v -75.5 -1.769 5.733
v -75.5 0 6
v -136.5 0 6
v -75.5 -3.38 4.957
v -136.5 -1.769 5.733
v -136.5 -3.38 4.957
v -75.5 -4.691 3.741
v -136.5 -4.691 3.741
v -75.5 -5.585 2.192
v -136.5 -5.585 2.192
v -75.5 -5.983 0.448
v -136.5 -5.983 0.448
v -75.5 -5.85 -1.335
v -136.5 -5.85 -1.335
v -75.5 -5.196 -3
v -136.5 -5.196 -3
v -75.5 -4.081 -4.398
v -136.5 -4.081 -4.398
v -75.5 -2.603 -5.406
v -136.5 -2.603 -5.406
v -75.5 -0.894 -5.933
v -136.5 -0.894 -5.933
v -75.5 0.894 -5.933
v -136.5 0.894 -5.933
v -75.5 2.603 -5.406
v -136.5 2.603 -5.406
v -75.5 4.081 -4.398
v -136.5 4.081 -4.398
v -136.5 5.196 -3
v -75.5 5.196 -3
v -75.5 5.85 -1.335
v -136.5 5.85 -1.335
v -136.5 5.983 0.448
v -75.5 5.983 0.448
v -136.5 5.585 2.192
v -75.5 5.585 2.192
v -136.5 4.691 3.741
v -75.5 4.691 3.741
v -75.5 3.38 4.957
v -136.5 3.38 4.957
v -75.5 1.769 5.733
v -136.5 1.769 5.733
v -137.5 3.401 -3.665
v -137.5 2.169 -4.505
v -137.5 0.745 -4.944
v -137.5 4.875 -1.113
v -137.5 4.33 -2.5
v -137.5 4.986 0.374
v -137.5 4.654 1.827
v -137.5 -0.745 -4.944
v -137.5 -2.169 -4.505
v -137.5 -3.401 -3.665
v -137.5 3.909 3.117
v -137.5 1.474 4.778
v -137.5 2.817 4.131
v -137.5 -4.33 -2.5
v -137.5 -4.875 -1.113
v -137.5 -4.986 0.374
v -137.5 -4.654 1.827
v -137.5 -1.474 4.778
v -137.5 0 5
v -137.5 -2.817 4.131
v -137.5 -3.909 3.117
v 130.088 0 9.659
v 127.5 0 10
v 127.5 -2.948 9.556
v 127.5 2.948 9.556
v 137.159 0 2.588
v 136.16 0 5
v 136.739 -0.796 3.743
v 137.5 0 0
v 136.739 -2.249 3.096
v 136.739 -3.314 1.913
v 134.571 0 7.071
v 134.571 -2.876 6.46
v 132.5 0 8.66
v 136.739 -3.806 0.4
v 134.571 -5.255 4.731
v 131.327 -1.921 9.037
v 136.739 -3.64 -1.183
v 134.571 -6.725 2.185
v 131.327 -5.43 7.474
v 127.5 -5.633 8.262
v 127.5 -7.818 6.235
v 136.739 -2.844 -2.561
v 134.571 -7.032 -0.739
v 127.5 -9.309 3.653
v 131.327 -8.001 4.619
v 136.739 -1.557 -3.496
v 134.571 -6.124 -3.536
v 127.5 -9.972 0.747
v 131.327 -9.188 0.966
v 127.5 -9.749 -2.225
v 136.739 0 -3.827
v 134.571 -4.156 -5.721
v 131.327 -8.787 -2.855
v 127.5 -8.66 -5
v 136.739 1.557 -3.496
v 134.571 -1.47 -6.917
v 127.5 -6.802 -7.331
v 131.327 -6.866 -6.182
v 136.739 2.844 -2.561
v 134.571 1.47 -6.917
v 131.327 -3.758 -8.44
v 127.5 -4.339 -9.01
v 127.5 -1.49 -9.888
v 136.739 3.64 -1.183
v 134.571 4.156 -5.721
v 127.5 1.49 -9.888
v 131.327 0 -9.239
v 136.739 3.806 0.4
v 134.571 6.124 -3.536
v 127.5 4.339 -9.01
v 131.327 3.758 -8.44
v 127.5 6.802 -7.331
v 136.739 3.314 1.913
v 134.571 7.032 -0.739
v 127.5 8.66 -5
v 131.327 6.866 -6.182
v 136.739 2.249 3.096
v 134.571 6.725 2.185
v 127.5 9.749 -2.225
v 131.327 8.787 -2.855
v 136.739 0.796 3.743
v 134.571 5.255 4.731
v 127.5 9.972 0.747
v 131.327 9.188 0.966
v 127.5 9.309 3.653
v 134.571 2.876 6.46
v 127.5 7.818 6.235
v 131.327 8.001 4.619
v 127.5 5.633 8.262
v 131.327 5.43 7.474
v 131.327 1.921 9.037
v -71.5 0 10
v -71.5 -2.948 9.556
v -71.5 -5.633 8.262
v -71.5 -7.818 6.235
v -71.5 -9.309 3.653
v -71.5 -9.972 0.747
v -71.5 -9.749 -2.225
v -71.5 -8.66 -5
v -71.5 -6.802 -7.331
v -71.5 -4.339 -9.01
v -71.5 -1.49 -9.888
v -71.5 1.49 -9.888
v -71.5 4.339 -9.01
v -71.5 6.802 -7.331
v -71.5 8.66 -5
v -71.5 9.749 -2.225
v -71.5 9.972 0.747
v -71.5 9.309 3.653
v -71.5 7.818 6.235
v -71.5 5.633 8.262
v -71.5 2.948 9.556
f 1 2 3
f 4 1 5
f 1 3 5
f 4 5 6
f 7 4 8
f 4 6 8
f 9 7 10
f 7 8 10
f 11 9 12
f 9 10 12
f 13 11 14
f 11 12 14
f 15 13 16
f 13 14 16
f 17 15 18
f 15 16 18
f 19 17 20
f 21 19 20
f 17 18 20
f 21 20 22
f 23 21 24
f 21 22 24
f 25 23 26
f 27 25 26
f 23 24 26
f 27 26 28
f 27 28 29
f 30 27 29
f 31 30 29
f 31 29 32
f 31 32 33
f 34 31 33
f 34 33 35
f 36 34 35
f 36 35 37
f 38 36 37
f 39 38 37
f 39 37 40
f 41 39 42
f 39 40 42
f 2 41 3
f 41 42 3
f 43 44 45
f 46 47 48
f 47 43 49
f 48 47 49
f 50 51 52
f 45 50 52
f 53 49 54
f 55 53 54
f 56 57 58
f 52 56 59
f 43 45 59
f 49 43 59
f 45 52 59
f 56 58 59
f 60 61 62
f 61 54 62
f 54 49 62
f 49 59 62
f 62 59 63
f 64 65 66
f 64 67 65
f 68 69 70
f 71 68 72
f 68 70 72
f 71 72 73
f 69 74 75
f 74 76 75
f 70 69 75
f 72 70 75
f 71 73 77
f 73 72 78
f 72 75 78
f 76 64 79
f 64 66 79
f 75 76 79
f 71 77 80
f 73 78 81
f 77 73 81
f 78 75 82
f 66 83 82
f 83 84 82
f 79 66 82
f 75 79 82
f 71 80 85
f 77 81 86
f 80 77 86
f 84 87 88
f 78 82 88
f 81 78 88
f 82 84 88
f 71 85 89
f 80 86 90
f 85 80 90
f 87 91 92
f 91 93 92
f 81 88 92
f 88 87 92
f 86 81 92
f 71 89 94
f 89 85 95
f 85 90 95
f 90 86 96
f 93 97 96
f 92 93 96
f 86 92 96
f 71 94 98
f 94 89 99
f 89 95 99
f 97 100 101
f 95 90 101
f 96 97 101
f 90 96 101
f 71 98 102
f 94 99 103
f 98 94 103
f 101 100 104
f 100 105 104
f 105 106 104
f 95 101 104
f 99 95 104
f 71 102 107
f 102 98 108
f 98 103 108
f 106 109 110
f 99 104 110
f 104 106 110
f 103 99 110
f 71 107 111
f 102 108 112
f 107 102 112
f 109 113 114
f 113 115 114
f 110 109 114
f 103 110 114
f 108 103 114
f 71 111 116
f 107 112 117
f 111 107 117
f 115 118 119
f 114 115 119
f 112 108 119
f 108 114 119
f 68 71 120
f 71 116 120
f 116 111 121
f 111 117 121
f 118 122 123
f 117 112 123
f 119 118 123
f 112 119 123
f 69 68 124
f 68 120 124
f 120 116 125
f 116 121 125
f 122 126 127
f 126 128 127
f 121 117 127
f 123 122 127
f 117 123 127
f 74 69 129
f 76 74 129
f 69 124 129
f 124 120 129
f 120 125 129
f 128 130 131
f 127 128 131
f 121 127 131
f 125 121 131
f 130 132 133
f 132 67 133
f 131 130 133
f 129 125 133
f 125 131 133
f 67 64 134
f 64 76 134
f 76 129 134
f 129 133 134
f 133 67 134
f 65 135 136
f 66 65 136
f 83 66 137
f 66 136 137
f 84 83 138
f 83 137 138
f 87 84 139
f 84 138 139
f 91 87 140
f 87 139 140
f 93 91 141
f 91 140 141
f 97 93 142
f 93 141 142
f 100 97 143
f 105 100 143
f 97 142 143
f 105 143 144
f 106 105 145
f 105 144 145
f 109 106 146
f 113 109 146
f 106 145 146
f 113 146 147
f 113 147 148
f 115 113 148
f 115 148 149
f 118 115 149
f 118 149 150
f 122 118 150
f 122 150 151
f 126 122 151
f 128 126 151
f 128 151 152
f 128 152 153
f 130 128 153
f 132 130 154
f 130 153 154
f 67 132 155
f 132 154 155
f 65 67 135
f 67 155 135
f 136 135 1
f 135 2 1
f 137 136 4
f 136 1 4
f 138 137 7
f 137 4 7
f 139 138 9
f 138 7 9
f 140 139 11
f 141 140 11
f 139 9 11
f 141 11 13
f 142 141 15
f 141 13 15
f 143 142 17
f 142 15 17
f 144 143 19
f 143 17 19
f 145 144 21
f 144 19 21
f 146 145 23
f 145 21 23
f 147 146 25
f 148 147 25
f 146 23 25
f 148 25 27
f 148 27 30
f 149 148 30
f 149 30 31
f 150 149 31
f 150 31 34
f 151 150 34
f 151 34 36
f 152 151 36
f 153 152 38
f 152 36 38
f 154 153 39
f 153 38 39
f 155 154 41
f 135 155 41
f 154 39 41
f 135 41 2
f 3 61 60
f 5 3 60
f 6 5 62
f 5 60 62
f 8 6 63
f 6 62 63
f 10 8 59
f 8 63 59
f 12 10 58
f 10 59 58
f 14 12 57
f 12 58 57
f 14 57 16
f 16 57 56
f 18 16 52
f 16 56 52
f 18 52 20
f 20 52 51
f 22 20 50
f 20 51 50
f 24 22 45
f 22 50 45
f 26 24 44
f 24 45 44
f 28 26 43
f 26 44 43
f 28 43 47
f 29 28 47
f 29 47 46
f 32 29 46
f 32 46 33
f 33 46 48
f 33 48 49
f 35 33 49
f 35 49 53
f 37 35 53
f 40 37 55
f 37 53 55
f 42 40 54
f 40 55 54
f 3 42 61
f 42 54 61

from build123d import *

# Parameters (mm, degrees)
FILLET1_R     = 10
CHAMFER1_SIZE = 1


with BuildPart() as part:
    # Sketch1 → Revolve1 (revolve)
    with BuildSketch(Plane.XY, mode=Mode.PRIVATE) as revolve1_sk:
        Polygon((-137.5, 0), (137.5, 0), (137.5, 10), (-71.5, 10), (-75.5, 6), (-137.5, 6), align=None)
    revolve(revolve1_sk.sketch.rotate(Axis((-137.5, 0, 0), (1, 0, 0)), 90), axis=Axis((-137.5, 0, 0), (1, 0, 0)))

    # Fillet1
    fillet1_edges = [part.edges().sort_by_distance(p)[0] for p in [
        (137.5, 0, -10),
    ]]
    fillet(fillet1_edges, radius=FILLET1_R)

    # Chamfer1
    chamfer1_edges = [part.edges().sort_by_distance(p)[0] for p in [
        (-137.5, 0, -6),
    ]]
    chamfer(chamfer1_edges, length=CHAMFER1_SIZE)


solid = part.part
